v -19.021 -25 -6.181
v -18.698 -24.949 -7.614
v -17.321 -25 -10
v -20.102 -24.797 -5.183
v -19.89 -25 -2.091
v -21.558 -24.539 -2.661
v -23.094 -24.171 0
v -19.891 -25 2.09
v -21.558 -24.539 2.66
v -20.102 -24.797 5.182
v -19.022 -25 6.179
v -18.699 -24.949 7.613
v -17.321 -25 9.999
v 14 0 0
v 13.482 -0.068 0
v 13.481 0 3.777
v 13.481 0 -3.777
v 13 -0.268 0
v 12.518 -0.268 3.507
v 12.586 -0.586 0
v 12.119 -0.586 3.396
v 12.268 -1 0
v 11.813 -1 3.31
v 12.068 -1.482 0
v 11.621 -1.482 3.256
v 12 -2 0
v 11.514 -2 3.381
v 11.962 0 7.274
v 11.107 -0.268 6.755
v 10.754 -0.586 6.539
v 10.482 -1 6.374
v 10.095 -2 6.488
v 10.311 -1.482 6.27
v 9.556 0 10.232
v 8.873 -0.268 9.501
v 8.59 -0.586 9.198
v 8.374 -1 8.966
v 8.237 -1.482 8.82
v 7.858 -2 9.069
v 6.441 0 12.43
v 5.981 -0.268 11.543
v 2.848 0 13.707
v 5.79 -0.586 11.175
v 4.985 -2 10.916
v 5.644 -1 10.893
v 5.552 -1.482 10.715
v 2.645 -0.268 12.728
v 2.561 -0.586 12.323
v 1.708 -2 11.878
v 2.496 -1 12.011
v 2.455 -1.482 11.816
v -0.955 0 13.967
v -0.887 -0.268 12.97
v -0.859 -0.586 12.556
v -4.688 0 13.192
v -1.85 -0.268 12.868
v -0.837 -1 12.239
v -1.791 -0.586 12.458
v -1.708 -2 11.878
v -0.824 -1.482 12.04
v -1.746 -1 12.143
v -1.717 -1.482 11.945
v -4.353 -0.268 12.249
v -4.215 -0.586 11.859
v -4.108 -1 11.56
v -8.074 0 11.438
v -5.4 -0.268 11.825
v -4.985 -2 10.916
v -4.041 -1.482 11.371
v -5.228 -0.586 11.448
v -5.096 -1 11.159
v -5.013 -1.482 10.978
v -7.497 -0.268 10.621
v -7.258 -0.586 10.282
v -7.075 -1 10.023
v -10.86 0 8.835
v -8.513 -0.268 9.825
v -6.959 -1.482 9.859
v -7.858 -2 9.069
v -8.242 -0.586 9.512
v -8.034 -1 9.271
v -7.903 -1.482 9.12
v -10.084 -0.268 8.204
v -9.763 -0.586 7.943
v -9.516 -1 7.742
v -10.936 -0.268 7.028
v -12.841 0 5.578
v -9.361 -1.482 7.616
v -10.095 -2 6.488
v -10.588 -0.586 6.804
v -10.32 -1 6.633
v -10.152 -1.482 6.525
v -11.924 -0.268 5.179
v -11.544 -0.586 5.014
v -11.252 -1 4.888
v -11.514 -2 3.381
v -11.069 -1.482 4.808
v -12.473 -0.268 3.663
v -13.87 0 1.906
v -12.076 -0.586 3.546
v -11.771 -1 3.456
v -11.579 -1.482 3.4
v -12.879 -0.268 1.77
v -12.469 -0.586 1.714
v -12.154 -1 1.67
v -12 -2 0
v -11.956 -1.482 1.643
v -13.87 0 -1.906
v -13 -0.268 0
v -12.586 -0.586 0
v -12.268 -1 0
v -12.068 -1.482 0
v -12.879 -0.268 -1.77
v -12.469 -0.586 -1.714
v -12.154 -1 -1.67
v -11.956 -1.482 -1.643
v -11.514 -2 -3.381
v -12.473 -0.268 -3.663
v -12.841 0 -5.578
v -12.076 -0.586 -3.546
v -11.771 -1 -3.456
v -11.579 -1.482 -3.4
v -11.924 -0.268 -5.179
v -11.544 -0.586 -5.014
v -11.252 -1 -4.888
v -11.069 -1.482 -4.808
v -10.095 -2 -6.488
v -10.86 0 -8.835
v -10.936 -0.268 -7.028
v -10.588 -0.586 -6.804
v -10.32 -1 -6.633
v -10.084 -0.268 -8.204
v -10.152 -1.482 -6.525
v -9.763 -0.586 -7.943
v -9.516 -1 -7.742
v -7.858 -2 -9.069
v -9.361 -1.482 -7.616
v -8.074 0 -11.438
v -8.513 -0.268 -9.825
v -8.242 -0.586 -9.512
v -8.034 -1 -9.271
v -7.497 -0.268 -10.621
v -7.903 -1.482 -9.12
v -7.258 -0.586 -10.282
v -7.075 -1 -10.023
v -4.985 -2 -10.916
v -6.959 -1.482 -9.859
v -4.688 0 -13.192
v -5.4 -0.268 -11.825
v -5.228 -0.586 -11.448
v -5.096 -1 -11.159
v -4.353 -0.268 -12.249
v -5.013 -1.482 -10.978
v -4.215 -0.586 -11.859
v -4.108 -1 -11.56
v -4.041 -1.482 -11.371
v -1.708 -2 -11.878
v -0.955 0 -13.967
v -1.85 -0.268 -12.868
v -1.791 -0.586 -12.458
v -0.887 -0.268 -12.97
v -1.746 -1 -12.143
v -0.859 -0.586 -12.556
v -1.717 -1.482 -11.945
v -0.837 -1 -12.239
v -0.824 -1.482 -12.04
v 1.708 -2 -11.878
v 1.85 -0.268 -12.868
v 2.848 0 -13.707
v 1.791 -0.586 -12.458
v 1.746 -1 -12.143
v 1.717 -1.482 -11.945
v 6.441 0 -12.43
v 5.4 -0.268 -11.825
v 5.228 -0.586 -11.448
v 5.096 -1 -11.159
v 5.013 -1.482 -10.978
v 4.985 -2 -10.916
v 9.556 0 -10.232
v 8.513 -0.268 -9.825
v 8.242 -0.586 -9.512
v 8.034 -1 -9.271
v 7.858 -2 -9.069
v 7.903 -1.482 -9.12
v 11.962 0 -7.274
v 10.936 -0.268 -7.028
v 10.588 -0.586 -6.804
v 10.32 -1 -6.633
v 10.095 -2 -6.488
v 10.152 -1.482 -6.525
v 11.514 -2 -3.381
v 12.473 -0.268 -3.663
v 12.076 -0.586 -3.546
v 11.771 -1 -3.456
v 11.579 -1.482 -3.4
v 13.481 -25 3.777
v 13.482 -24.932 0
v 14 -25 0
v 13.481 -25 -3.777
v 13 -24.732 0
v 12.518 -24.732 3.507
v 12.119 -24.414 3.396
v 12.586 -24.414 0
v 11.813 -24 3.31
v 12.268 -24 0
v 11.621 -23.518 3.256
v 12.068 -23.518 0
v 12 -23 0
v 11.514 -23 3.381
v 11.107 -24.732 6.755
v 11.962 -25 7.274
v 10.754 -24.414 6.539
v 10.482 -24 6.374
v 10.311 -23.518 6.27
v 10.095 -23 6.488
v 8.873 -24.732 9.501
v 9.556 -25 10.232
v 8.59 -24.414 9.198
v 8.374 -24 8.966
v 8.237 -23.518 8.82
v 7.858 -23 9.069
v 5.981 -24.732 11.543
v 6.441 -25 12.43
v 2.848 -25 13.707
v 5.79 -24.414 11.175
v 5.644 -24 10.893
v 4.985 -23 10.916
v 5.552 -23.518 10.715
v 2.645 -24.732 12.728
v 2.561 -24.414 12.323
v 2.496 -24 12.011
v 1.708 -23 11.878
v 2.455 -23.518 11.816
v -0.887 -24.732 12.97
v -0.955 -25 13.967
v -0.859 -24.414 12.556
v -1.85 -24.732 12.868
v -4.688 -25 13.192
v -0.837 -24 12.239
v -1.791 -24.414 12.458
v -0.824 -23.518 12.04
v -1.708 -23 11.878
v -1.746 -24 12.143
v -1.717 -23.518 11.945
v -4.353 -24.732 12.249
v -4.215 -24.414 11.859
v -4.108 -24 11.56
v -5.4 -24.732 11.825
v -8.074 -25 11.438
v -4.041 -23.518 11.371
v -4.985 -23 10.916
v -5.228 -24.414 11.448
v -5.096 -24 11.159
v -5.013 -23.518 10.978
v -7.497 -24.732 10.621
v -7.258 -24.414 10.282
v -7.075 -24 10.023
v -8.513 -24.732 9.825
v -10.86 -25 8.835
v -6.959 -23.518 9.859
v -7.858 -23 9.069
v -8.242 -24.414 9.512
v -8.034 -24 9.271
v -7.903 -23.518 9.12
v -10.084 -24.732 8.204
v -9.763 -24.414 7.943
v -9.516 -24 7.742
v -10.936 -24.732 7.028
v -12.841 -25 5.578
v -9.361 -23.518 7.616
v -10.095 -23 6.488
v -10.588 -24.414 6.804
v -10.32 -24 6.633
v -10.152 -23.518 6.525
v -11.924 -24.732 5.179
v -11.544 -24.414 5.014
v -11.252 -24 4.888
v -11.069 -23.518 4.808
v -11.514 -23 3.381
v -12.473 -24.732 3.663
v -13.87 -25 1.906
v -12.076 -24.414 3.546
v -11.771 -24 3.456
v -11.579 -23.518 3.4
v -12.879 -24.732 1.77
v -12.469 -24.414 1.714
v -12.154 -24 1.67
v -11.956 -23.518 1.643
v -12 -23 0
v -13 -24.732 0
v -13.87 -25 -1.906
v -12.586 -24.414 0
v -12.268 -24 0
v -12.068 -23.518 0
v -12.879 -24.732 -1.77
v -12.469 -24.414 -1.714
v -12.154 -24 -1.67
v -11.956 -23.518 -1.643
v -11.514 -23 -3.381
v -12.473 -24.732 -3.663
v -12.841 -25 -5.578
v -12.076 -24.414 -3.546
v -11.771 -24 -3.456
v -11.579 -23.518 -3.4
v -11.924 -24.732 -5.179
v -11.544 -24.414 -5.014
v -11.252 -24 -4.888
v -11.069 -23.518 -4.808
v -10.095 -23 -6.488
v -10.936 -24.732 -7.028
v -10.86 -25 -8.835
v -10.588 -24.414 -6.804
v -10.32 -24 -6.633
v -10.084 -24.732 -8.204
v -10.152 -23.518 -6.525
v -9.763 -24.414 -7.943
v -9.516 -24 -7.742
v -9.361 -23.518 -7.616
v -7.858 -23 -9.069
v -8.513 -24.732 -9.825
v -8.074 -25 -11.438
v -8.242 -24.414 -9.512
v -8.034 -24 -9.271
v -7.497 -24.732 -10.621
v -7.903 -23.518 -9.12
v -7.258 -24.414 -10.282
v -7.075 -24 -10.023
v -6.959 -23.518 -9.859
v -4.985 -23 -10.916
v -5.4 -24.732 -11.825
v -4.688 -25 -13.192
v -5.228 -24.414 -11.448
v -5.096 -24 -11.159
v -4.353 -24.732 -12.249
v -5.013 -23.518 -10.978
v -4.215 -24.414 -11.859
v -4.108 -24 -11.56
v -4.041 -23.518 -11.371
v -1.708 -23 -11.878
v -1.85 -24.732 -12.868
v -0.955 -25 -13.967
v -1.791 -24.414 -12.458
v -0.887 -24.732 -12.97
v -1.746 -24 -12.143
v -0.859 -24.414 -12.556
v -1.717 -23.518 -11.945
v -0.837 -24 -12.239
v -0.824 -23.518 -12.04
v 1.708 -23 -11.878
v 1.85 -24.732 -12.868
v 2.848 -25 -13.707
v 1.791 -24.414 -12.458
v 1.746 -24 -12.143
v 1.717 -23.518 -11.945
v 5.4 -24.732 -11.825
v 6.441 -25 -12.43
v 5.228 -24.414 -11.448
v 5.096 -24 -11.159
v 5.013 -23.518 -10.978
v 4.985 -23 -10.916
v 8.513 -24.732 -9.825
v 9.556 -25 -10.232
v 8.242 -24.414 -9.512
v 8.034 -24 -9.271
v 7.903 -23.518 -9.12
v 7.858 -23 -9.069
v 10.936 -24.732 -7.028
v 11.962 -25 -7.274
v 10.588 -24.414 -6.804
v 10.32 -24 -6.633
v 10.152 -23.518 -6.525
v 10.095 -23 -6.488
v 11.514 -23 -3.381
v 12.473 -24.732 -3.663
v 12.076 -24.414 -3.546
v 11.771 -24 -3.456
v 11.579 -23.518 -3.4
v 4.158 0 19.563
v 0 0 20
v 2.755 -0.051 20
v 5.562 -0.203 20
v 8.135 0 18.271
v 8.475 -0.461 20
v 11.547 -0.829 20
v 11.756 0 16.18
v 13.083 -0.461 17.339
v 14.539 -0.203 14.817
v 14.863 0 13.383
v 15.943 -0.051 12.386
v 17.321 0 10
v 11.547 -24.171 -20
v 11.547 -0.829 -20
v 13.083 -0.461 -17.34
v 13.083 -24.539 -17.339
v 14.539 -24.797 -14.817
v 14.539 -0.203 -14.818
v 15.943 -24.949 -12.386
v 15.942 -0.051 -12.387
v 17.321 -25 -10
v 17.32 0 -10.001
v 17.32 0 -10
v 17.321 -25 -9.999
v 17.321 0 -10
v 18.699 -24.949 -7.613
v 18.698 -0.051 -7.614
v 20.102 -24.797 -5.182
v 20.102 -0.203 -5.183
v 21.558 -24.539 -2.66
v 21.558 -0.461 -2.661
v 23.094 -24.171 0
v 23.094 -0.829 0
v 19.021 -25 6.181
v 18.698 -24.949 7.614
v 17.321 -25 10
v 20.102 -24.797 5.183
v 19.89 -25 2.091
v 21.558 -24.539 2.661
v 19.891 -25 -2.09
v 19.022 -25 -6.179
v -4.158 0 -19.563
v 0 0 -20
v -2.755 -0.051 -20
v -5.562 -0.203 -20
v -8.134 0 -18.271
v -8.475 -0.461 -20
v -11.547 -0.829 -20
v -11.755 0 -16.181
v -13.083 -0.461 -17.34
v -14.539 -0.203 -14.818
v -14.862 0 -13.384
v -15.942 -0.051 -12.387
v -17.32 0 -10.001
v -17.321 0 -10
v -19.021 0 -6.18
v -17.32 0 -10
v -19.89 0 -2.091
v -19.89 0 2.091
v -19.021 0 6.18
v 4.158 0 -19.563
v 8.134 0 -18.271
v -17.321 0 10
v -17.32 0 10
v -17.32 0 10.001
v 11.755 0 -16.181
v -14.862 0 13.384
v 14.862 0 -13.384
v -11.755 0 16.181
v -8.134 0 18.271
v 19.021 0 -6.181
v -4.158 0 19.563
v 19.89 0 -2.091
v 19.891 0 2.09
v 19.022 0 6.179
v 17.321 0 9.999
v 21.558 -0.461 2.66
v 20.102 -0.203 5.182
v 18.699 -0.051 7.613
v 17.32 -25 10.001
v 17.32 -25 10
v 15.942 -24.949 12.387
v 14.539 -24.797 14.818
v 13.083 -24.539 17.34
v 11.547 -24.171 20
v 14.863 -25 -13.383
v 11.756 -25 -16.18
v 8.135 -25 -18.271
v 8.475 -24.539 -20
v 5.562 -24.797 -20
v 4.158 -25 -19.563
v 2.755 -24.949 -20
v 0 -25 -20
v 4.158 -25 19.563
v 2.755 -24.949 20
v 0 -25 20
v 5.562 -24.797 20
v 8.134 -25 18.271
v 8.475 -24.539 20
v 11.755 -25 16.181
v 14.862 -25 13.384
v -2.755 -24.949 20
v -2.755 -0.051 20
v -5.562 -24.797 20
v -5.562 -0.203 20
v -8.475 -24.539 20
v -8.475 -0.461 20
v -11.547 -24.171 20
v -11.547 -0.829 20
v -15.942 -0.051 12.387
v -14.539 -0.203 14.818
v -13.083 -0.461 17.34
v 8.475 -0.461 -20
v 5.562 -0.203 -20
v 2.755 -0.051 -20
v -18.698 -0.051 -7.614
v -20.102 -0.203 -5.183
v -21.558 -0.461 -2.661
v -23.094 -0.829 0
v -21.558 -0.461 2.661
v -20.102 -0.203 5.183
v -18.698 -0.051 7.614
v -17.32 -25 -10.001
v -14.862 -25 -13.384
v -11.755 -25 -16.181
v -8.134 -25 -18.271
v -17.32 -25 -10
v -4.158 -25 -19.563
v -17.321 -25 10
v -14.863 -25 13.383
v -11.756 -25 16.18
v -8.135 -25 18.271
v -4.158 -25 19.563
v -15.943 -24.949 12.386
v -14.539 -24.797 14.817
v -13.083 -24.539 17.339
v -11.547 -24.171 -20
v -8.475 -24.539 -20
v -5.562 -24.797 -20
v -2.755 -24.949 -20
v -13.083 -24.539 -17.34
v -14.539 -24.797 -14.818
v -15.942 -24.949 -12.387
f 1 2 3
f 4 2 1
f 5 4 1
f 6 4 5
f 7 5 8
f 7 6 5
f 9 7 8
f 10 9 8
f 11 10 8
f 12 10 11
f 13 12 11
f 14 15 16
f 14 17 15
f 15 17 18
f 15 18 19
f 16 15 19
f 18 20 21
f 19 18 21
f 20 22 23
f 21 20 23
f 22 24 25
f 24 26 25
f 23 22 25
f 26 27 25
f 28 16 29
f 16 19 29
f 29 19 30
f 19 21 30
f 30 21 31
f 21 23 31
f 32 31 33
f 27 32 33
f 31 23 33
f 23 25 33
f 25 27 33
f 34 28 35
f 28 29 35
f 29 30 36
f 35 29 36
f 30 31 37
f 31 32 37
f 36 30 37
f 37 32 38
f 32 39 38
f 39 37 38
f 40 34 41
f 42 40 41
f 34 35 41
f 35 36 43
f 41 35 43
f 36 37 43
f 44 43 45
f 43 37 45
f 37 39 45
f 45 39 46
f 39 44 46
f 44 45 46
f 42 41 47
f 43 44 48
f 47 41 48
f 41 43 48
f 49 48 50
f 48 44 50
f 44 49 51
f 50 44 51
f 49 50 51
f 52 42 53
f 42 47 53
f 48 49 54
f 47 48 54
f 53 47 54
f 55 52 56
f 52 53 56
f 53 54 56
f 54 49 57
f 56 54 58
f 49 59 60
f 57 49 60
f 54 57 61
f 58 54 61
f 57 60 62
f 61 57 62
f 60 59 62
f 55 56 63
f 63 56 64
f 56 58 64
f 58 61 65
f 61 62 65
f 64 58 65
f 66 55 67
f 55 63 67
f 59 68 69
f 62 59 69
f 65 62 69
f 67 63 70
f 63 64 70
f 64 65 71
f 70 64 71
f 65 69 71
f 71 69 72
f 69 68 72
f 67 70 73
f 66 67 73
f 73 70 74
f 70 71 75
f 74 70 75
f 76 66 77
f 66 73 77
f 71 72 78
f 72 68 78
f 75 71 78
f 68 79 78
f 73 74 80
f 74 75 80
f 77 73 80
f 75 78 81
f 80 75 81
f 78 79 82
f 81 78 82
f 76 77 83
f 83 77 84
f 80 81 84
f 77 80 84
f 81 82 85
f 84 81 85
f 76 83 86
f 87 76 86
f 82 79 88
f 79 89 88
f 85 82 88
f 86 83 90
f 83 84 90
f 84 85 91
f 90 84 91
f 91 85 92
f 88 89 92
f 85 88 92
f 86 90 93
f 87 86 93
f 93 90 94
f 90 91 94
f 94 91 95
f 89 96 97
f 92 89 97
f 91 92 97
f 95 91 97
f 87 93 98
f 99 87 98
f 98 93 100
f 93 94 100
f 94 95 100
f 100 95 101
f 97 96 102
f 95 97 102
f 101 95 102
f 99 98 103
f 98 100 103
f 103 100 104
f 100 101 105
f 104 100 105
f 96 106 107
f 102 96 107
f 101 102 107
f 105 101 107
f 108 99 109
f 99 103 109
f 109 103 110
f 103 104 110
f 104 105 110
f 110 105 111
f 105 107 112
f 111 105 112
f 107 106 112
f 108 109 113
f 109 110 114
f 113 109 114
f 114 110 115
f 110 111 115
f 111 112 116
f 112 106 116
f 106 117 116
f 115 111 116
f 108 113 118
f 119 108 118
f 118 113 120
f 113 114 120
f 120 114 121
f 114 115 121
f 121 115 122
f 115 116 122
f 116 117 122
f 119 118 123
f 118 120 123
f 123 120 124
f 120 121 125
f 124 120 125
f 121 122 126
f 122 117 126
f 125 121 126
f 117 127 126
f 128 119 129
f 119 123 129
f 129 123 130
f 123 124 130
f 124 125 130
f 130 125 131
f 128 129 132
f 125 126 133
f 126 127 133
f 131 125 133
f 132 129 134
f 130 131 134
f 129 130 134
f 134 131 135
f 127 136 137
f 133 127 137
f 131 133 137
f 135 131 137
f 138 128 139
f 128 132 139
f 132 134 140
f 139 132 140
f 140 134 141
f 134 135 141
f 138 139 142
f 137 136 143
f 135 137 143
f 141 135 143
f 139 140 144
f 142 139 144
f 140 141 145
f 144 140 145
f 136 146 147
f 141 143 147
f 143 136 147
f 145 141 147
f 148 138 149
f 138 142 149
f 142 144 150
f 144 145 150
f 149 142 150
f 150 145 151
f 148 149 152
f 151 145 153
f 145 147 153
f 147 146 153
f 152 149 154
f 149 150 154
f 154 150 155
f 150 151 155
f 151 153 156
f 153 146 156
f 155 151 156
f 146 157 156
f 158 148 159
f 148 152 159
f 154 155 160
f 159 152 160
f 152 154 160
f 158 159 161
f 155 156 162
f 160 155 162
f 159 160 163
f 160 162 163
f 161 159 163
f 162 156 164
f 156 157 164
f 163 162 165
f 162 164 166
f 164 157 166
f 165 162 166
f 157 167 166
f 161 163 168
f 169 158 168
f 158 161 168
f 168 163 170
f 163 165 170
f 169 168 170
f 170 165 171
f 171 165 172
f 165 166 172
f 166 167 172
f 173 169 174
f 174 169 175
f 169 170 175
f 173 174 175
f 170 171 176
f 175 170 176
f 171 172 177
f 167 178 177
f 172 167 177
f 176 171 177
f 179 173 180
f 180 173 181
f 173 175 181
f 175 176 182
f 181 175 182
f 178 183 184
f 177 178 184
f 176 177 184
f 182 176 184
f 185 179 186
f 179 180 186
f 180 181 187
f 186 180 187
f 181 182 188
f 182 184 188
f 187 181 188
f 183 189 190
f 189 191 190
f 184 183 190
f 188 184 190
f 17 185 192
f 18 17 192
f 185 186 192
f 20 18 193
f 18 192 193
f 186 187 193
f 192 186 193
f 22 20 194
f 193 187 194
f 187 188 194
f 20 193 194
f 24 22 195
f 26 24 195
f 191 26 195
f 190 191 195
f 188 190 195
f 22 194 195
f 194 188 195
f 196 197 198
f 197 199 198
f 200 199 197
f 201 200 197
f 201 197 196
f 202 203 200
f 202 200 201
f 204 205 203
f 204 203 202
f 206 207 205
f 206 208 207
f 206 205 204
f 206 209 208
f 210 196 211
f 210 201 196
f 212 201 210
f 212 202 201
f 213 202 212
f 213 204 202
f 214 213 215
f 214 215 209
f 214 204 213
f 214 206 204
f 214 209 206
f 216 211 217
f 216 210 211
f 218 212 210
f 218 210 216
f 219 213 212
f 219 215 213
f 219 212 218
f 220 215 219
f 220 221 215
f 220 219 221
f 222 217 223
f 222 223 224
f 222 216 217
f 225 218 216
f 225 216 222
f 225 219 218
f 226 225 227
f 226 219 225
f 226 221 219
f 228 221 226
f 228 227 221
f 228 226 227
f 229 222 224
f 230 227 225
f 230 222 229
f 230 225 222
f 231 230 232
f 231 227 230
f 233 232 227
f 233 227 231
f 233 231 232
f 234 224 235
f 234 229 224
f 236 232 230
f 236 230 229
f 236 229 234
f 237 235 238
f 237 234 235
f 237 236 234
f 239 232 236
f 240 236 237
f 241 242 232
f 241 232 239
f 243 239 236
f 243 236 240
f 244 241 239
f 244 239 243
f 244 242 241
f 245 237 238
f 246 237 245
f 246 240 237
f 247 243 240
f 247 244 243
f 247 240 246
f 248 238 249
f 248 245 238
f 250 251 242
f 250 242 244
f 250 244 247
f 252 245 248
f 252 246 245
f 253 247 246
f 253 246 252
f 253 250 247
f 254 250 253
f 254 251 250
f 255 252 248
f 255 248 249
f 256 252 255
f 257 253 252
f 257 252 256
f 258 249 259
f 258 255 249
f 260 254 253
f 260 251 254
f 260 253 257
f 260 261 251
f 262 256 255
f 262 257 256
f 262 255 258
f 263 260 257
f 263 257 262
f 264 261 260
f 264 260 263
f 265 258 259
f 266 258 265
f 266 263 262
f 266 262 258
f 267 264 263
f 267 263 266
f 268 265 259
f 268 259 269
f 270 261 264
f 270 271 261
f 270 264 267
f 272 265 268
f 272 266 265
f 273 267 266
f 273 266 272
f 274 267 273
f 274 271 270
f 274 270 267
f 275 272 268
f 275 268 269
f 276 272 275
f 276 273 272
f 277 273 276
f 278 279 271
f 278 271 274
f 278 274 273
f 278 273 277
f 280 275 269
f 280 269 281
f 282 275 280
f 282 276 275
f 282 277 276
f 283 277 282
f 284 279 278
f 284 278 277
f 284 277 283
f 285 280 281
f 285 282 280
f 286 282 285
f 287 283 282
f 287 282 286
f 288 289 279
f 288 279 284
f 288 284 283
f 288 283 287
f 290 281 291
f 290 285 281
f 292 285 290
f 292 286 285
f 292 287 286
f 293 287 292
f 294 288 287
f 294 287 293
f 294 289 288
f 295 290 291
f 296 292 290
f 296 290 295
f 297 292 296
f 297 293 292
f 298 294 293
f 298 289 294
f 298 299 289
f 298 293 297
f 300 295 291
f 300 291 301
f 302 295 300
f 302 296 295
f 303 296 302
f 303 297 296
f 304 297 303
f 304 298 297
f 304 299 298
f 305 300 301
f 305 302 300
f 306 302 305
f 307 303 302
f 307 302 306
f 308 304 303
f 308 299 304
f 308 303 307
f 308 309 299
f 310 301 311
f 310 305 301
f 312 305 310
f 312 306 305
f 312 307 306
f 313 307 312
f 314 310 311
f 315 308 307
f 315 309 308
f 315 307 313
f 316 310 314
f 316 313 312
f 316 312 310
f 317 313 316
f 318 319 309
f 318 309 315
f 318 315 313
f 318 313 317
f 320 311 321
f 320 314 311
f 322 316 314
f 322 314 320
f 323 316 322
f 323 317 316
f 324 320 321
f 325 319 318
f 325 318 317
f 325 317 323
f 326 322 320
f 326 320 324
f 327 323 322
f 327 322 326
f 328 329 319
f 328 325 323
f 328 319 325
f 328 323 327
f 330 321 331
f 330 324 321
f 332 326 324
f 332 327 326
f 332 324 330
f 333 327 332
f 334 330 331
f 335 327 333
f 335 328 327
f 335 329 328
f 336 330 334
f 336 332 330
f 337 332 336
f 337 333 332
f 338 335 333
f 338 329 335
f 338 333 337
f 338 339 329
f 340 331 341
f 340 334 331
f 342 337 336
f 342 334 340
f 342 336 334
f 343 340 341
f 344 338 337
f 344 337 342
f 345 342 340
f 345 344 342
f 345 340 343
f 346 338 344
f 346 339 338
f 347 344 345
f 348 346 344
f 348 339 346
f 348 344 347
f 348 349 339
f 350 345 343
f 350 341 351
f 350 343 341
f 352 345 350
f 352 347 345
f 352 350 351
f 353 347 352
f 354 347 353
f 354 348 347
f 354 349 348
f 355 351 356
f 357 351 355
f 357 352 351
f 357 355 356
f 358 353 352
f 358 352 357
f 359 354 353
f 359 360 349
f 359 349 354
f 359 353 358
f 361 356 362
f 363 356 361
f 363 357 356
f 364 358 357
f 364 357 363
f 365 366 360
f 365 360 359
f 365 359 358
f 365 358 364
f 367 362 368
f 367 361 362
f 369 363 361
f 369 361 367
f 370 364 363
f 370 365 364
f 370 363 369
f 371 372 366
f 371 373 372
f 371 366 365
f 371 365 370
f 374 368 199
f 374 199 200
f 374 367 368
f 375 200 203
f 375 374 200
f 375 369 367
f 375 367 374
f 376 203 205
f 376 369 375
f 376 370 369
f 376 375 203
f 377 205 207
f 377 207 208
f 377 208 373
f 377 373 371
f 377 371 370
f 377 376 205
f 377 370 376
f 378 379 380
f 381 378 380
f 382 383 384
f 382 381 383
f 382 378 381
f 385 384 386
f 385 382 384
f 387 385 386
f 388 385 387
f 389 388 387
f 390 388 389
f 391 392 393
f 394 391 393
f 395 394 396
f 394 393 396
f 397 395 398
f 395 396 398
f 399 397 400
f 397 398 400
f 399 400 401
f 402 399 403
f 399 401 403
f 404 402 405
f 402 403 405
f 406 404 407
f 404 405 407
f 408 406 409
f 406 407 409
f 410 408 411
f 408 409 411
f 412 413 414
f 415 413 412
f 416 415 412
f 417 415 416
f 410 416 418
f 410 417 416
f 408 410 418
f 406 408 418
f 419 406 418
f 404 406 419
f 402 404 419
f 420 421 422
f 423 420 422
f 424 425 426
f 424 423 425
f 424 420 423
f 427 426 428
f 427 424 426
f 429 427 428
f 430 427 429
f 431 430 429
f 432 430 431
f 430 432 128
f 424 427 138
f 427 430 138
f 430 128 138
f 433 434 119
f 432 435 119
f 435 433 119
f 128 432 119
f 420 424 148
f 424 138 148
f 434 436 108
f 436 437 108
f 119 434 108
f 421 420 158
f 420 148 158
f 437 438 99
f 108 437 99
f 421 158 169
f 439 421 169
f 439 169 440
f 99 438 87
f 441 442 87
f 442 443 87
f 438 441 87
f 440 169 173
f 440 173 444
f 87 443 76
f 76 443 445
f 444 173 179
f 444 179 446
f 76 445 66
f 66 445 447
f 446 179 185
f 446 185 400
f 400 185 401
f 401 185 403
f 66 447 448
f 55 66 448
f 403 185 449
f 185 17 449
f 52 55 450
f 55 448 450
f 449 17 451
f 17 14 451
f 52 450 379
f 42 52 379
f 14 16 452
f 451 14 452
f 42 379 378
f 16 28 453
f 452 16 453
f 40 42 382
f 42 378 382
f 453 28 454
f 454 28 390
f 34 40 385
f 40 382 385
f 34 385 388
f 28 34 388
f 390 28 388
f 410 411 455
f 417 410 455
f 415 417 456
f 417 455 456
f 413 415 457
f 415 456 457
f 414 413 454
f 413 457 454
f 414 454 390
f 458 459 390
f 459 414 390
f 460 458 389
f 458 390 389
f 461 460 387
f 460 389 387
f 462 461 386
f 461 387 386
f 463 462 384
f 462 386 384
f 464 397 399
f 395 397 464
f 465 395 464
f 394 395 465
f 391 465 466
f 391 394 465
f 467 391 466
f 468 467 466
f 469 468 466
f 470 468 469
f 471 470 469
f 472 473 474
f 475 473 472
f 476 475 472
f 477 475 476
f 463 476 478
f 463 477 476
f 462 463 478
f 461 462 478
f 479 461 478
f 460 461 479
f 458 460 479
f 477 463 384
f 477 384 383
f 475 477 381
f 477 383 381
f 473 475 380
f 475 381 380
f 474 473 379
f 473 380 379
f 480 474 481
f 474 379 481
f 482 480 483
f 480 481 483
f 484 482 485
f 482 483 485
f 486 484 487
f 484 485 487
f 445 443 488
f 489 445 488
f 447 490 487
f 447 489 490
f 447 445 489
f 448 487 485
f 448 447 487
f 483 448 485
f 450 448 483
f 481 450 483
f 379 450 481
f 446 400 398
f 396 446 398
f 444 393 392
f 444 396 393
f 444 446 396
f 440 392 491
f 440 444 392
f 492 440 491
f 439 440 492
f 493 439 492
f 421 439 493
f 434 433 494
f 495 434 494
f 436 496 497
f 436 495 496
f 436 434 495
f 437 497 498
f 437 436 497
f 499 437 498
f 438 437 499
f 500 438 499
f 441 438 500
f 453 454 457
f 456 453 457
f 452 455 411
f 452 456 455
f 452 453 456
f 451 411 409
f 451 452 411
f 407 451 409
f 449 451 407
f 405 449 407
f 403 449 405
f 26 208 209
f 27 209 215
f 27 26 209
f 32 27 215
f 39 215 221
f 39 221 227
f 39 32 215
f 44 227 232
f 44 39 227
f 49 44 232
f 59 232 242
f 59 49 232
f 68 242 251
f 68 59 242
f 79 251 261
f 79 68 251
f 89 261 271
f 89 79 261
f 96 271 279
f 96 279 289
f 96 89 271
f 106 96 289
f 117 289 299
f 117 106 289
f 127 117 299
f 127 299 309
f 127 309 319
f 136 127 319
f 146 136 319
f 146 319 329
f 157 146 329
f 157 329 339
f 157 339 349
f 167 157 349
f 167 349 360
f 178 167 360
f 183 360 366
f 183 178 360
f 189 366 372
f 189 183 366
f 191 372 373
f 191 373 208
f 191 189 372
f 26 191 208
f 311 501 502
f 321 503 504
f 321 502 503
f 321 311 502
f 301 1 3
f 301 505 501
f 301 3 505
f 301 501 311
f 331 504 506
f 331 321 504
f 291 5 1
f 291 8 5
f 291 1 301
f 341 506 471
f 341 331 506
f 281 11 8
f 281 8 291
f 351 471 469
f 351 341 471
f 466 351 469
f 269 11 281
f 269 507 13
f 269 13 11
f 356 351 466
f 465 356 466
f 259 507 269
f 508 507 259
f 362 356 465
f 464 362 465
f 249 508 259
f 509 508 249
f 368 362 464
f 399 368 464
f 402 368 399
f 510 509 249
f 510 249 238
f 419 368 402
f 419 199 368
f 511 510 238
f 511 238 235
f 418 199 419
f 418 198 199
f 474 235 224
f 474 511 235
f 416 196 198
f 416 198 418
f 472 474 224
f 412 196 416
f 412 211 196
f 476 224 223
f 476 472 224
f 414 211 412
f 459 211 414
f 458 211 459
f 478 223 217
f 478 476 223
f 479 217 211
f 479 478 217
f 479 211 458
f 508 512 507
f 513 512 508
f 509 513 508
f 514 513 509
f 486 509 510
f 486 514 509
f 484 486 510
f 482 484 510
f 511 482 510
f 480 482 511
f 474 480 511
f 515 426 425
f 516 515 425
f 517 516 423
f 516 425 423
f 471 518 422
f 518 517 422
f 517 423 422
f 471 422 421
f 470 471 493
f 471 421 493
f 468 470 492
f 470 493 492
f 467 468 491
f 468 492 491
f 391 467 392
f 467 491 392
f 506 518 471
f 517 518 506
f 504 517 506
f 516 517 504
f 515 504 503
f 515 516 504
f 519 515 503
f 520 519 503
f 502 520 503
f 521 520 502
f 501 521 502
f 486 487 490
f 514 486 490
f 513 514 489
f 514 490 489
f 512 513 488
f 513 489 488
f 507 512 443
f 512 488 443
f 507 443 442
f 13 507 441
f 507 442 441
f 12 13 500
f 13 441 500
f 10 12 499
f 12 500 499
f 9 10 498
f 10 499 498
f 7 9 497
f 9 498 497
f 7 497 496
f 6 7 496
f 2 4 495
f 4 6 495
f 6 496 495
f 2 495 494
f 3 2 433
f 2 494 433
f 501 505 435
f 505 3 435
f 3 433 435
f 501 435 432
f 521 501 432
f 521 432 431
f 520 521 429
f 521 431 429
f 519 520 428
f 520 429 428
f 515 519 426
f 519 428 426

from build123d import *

# Parameters (mm, degrees)
F0_R     = 12
F1_DEPTH = 25
F4_R     = 2


with BuildPart() as f1:
    # F0 (on Front) → F1 (new body)
    with BuildSketch(Plane.XZ):
        Polygon((11.547005, 20), (-11.547005, 20), (-23.094011, 0), (-11.547005, -20), (11.547005, -20), (23.094011, 0), align=None)
        Circle(F0_R, mode=Mode.SUBTRACT)
    extrude(amount=F1_DEPTH)

    # F2 (on Right) → F3 (revolve, cut)
    with BuildSketch(Plane.YZ):
        Polygon((-25, 56.939398), (-25, 20), (-18.841215, 42.984898), (-6.158785, 42.984898), (0, 20), (0, 56.939398), align=None)
    revolve(axis=Axis((0, -3.116442, 0), (0, 1, 0)), mode=Mode.SUBTRACT)

    # F4
    f4_edges = [f1.edges().sort_by_distance(p)[0] for p in [
        (-12, -25, 0),
        (-12, 0, 0),
    ]]
    fillet(f4_edges, radius=F4_R)


solid = f1.part
